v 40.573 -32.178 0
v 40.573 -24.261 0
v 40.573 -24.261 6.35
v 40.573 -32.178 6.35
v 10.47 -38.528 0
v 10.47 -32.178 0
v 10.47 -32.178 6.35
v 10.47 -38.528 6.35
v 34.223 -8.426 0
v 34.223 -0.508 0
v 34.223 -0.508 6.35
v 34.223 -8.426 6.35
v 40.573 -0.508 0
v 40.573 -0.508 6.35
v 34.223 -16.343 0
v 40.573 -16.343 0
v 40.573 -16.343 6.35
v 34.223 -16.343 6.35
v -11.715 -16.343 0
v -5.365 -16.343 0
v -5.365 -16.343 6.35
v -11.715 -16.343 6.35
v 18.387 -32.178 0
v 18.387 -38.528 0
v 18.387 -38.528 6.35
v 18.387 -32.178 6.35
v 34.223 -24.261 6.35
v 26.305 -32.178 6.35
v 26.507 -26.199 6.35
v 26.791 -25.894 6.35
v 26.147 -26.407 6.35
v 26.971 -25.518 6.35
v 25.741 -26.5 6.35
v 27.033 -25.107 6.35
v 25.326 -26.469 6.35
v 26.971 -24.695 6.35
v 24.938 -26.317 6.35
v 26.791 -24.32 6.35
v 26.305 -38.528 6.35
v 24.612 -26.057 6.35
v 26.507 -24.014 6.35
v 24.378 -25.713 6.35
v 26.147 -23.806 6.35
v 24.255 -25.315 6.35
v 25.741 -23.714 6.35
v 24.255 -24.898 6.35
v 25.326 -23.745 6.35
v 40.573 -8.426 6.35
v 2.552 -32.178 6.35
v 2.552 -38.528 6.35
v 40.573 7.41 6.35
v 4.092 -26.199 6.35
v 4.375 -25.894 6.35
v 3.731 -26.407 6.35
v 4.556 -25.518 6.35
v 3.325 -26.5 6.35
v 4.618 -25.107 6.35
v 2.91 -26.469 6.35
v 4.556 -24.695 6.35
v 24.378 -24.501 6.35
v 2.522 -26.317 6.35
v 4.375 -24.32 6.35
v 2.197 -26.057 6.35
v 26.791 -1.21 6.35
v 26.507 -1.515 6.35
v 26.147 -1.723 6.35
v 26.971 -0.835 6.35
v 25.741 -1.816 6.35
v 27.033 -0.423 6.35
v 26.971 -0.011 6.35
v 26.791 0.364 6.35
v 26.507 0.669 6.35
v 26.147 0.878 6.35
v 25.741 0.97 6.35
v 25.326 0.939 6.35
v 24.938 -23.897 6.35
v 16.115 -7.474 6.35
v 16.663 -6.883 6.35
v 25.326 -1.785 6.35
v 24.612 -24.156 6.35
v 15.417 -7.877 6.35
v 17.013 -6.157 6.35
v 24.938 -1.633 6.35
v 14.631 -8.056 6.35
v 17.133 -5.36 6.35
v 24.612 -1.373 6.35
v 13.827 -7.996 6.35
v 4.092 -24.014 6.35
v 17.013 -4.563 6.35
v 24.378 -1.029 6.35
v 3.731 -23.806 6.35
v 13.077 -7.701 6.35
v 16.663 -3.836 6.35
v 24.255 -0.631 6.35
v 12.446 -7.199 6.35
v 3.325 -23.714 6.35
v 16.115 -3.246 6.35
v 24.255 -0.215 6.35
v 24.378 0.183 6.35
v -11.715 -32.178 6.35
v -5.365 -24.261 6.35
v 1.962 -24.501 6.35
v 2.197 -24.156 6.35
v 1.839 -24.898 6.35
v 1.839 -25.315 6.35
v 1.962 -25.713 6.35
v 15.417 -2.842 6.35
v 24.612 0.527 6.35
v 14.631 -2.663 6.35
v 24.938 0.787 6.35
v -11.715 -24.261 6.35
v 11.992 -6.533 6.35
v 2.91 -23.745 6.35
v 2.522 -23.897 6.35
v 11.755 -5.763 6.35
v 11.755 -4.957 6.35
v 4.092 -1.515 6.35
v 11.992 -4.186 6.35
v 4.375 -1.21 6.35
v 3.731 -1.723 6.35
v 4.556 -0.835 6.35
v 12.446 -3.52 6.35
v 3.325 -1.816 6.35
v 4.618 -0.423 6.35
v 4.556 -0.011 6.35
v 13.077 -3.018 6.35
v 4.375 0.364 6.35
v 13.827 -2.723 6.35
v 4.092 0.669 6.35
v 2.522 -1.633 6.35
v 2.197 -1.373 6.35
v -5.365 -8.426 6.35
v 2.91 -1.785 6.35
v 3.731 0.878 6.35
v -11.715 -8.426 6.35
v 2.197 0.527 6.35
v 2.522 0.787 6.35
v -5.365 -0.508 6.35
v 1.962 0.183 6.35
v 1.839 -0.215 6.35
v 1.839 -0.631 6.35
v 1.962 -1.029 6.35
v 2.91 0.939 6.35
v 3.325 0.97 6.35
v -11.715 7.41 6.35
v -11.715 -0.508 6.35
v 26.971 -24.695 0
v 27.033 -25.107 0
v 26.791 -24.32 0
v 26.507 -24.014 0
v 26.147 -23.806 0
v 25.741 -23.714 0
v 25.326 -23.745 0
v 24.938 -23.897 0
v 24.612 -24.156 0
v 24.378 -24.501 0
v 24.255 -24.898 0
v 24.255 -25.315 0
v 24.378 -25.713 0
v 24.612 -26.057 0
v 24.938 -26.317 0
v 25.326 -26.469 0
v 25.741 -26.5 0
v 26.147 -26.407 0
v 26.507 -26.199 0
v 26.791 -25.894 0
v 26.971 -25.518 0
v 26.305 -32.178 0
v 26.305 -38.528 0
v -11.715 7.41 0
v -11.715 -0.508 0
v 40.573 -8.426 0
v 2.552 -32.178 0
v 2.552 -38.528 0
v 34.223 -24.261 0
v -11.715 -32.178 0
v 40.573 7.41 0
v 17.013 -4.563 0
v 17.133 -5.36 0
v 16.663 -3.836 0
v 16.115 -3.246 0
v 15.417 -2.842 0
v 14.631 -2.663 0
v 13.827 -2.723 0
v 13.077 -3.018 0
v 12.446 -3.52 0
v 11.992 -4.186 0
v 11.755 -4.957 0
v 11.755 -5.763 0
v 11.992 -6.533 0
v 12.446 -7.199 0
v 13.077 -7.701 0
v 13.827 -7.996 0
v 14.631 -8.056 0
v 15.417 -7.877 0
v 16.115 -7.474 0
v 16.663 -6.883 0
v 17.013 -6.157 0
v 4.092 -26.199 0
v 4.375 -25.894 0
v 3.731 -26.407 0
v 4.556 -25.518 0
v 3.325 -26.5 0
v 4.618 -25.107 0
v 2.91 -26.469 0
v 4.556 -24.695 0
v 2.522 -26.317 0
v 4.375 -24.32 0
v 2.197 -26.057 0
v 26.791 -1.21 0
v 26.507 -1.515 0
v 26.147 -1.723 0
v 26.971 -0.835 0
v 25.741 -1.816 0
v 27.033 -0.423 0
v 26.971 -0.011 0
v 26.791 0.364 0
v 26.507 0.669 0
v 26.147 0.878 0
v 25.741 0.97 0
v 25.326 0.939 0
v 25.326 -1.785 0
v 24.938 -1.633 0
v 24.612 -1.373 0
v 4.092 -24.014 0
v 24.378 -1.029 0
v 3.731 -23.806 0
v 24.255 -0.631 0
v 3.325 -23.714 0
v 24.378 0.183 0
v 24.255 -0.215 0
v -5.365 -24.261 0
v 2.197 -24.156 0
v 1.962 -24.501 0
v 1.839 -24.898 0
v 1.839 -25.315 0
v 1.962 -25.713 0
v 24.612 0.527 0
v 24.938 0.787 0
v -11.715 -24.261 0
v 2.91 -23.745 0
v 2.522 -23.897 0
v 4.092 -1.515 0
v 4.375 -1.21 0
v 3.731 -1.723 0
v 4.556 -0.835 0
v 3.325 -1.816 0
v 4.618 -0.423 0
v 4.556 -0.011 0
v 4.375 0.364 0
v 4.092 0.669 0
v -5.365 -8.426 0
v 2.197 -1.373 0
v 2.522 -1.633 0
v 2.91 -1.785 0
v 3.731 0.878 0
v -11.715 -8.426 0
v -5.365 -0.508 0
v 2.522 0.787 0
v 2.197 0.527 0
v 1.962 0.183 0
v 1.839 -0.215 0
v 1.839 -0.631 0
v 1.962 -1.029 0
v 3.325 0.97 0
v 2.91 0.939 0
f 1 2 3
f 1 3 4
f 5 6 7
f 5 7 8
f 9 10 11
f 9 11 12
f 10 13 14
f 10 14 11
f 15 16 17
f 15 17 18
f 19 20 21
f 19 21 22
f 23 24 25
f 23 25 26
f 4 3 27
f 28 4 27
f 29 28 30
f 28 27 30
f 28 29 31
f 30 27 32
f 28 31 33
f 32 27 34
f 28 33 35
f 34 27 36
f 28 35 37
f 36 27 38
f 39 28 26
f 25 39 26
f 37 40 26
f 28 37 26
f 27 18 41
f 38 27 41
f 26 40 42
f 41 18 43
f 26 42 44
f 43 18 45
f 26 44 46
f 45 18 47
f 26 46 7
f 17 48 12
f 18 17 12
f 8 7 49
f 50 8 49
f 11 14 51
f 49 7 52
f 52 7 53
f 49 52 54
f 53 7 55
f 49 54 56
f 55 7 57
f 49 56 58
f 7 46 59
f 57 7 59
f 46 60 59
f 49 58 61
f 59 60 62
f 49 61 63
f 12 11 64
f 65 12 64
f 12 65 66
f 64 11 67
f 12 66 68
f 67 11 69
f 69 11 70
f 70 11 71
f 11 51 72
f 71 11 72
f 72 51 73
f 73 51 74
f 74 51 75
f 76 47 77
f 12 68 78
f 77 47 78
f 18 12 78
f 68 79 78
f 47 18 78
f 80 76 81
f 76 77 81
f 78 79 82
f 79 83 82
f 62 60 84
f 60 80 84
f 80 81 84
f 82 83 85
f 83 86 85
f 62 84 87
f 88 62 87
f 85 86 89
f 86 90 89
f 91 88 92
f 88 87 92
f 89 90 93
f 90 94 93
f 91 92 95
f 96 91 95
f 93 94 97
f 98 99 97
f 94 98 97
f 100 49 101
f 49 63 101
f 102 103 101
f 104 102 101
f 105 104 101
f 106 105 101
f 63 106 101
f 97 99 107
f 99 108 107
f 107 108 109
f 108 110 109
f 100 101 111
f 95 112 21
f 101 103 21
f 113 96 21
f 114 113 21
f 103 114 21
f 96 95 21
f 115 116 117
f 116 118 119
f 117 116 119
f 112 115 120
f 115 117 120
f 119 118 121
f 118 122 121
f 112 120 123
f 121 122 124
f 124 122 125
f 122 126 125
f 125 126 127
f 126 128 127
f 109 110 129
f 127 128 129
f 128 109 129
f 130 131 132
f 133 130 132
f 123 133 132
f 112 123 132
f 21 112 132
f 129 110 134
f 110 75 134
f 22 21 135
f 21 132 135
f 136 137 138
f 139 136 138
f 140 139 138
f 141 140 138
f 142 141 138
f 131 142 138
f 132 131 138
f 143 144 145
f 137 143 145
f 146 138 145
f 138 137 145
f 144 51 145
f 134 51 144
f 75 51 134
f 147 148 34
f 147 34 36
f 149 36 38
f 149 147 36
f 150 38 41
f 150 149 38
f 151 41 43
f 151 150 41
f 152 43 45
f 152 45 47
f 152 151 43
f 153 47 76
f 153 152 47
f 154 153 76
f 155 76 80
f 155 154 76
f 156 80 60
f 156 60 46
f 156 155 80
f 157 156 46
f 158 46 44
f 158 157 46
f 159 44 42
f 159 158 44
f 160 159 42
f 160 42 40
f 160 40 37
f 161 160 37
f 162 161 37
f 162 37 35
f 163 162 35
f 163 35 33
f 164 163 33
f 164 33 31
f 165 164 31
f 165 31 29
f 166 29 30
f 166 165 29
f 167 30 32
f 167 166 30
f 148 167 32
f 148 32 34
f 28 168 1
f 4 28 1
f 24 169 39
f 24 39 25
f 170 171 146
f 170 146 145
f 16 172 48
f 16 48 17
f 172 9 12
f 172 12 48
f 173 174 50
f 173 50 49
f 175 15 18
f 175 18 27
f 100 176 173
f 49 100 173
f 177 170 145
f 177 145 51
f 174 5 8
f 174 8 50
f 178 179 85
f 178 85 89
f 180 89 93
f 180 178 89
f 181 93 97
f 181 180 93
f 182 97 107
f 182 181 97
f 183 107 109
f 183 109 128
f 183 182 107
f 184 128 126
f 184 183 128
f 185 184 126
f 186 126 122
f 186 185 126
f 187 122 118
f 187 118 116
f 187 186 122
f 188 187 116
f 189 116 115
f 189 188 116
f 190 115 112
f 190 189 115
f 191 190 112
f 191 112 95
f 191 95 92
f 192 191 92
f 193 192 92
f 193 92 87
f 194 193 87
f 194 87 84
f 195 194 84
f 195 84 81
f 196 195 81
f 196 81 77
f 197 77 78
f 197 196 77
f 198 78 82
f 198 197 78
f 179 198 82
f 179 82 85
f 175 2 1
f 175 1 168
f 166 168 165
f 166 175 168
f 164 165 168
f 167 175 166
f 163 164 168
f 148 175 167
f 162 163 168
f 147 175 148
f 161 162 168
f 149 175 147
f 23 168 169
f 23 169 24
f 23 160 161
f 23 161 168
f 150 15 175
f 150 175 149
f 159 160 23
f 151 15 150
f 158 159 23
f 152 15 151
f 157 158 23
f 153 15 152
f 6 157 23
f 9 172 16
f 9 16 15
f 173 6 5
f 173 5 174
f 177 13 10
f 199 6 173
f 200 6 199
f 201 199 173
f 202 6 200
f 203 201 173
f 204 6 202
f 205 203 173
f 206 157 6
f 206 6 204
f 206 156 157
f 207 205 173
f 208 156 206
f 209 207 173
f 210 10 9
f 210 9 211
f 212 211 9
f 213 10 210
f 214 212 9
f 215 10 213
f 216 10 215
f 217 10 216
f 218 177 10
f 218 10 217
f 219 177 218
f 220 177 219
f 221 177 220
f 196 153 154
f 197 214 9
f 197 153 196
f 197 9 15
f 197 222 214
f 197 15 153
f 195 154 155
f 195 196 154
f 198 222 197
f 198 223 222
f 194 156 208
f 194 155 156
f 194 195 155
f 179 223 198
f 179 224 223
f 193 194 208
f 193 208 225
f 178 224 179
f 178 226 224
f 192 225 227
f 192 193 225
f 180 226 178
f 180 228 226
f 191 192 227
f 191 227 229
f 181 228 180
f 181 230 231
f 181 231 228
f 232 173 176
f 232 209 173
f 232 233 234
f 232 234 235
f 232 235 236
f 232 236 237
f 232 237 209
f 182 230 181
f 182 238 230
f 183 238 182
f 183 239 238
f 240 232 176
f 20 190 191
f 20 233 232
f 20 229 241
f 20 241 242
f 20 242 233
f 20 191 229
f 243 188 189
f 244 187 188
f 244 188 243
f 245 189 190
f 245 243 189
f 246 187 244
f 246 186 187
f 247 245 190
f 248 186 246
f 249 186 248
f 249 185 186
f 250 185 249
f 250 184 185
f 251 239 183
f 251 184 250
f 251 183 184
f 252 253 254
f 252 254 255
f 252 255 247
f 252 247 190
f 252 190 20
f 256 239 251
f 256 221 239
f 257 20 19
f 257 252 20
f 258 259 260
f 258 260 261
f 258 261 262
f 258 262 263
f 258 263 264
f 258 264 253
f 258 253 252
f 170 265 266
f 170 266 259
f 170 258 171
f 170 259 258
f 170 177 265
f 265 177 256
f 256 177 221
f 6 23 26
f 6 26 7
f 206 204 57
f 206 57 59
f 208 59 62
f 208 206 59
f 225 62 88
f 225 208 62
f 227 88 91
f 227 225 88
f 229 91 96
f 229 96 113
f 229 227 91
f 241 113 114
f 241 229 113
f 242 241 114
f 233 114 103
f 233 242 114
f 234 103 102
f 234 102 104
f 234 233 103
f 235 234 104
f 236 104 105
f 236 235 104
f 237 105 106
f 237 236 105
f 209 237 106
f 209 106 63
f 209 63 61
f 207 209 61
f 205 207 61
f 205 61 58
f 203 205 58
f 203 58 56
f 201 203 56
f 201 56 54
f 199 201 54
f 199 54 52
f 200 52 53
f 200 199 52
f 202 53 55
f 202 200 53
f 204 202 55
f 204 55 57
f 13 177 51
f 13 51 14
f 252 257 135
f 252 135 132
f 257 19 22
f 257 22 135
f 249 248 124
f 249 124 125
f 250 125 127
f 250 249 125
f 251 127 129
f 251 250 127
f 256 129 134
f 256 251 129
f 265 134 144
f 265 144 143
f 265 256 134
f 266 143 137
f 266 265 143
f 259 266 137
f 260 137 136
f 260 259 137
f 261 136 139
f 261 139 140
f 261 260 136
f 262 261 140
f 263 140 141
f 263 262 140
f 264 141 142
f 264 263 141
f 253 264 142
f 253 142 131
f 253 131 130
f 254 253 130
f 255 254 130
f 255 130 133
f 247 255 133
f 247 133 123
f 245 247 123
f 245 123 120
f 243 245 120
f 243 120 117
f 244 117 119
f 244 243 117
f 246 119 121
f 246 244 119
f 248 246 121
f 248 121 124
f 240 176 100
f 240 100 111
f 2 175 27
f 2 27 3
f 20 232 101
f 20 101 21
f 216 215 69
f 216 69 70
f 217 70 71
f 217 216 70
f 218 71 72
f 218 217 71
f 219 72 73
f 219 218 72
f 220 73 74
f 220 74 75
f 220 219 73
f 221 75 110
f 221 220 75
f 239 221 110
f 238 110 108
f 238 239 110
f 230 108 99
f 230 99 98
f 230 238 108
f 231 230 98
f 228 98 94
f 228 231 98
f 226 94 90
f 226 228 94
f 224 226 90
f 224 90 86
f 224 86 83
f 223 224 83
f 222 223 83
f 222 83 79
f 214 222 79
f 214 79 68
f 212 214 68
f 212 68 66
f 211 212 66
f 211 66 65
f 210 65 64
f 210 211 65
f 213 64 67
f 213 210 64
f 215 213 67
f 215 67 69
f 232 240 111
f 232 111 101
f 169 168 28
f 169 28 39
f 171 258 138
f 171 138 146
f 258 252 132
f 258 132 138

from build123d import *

# Parameters (mm, degrees)
SKETCH1_R           = 1.397
SKETCH1_R_2         = 2.704093878
BOSS_EXTRUDE1_DEPTH = 6.35


with BuildPart() as part:
    # Sketch1 → Boss-Extrude1 (new body)
    with BuildSketch(Plane.XY):
        Polygon((34.222577161, -16.34309441), (34.222577161, -24.260672631), (40.572577161, -24.260672631), (40.572577161, -32.178250852), (34.222577161, -32.178250852), (26.30499894, -32.178250852), (26.30499894, -38.528250852), (18.387420719, -38.528250852), (18.387420719, -32.178250852), (10.469842498, -32.178250852), (10.469842498, -38.528250852), (2.552264276, -38.528250852), (2.552264276, -32.178250852), (-5.365313945, -32.178250852), (-11.715313945, -32.178250852), (-11.715313945, -24.260672631), (-5.365313945, -24.260672631), (-5.365313945, -16.34309441), (-11.715313945, -16.34309441), (-11.715313945, -8.425516188), (-5.365313945, -8.425516188), (-5.365313945, -0.507937967), (-11.715313945, -0.507937967), (-11.715313945, 7.409640254), (40.572577161, 7.409640254), (40.572577161, -0.507937967), (34.222577161, -0.507937967), (34.222577161, -8.425516188), (40.572577161, -8.425516188), (40.572577161, -16.34309441), align=None)
        with Locations((3.220865479, -0.422913296)):
            Circle(SKETCH1_R, mode=Mode.SUBTRACT)
        with Locations((25.636397737, -0.422913296)):
            Circle(SKETCH1_R, mode=Mode.SUBTRACT)
        with Locations((25.636397737, -25.106684096)):
            Circle(SKETCH1_R, mode=Mode.SUBTRACT)
        with Locations((3.220865479, -25.106684096)):
            Circle(SKETCH1_R, mode=Mode.SUBTRACT)
        with Locations((14.428631608, -5.359667456)):
            Circle(SKETCH1_R_2, mode=Mode.SUBTRACT)
    extrude(amount=BOSS_EXTRUDE1_DEPTH)


solid = part.part
